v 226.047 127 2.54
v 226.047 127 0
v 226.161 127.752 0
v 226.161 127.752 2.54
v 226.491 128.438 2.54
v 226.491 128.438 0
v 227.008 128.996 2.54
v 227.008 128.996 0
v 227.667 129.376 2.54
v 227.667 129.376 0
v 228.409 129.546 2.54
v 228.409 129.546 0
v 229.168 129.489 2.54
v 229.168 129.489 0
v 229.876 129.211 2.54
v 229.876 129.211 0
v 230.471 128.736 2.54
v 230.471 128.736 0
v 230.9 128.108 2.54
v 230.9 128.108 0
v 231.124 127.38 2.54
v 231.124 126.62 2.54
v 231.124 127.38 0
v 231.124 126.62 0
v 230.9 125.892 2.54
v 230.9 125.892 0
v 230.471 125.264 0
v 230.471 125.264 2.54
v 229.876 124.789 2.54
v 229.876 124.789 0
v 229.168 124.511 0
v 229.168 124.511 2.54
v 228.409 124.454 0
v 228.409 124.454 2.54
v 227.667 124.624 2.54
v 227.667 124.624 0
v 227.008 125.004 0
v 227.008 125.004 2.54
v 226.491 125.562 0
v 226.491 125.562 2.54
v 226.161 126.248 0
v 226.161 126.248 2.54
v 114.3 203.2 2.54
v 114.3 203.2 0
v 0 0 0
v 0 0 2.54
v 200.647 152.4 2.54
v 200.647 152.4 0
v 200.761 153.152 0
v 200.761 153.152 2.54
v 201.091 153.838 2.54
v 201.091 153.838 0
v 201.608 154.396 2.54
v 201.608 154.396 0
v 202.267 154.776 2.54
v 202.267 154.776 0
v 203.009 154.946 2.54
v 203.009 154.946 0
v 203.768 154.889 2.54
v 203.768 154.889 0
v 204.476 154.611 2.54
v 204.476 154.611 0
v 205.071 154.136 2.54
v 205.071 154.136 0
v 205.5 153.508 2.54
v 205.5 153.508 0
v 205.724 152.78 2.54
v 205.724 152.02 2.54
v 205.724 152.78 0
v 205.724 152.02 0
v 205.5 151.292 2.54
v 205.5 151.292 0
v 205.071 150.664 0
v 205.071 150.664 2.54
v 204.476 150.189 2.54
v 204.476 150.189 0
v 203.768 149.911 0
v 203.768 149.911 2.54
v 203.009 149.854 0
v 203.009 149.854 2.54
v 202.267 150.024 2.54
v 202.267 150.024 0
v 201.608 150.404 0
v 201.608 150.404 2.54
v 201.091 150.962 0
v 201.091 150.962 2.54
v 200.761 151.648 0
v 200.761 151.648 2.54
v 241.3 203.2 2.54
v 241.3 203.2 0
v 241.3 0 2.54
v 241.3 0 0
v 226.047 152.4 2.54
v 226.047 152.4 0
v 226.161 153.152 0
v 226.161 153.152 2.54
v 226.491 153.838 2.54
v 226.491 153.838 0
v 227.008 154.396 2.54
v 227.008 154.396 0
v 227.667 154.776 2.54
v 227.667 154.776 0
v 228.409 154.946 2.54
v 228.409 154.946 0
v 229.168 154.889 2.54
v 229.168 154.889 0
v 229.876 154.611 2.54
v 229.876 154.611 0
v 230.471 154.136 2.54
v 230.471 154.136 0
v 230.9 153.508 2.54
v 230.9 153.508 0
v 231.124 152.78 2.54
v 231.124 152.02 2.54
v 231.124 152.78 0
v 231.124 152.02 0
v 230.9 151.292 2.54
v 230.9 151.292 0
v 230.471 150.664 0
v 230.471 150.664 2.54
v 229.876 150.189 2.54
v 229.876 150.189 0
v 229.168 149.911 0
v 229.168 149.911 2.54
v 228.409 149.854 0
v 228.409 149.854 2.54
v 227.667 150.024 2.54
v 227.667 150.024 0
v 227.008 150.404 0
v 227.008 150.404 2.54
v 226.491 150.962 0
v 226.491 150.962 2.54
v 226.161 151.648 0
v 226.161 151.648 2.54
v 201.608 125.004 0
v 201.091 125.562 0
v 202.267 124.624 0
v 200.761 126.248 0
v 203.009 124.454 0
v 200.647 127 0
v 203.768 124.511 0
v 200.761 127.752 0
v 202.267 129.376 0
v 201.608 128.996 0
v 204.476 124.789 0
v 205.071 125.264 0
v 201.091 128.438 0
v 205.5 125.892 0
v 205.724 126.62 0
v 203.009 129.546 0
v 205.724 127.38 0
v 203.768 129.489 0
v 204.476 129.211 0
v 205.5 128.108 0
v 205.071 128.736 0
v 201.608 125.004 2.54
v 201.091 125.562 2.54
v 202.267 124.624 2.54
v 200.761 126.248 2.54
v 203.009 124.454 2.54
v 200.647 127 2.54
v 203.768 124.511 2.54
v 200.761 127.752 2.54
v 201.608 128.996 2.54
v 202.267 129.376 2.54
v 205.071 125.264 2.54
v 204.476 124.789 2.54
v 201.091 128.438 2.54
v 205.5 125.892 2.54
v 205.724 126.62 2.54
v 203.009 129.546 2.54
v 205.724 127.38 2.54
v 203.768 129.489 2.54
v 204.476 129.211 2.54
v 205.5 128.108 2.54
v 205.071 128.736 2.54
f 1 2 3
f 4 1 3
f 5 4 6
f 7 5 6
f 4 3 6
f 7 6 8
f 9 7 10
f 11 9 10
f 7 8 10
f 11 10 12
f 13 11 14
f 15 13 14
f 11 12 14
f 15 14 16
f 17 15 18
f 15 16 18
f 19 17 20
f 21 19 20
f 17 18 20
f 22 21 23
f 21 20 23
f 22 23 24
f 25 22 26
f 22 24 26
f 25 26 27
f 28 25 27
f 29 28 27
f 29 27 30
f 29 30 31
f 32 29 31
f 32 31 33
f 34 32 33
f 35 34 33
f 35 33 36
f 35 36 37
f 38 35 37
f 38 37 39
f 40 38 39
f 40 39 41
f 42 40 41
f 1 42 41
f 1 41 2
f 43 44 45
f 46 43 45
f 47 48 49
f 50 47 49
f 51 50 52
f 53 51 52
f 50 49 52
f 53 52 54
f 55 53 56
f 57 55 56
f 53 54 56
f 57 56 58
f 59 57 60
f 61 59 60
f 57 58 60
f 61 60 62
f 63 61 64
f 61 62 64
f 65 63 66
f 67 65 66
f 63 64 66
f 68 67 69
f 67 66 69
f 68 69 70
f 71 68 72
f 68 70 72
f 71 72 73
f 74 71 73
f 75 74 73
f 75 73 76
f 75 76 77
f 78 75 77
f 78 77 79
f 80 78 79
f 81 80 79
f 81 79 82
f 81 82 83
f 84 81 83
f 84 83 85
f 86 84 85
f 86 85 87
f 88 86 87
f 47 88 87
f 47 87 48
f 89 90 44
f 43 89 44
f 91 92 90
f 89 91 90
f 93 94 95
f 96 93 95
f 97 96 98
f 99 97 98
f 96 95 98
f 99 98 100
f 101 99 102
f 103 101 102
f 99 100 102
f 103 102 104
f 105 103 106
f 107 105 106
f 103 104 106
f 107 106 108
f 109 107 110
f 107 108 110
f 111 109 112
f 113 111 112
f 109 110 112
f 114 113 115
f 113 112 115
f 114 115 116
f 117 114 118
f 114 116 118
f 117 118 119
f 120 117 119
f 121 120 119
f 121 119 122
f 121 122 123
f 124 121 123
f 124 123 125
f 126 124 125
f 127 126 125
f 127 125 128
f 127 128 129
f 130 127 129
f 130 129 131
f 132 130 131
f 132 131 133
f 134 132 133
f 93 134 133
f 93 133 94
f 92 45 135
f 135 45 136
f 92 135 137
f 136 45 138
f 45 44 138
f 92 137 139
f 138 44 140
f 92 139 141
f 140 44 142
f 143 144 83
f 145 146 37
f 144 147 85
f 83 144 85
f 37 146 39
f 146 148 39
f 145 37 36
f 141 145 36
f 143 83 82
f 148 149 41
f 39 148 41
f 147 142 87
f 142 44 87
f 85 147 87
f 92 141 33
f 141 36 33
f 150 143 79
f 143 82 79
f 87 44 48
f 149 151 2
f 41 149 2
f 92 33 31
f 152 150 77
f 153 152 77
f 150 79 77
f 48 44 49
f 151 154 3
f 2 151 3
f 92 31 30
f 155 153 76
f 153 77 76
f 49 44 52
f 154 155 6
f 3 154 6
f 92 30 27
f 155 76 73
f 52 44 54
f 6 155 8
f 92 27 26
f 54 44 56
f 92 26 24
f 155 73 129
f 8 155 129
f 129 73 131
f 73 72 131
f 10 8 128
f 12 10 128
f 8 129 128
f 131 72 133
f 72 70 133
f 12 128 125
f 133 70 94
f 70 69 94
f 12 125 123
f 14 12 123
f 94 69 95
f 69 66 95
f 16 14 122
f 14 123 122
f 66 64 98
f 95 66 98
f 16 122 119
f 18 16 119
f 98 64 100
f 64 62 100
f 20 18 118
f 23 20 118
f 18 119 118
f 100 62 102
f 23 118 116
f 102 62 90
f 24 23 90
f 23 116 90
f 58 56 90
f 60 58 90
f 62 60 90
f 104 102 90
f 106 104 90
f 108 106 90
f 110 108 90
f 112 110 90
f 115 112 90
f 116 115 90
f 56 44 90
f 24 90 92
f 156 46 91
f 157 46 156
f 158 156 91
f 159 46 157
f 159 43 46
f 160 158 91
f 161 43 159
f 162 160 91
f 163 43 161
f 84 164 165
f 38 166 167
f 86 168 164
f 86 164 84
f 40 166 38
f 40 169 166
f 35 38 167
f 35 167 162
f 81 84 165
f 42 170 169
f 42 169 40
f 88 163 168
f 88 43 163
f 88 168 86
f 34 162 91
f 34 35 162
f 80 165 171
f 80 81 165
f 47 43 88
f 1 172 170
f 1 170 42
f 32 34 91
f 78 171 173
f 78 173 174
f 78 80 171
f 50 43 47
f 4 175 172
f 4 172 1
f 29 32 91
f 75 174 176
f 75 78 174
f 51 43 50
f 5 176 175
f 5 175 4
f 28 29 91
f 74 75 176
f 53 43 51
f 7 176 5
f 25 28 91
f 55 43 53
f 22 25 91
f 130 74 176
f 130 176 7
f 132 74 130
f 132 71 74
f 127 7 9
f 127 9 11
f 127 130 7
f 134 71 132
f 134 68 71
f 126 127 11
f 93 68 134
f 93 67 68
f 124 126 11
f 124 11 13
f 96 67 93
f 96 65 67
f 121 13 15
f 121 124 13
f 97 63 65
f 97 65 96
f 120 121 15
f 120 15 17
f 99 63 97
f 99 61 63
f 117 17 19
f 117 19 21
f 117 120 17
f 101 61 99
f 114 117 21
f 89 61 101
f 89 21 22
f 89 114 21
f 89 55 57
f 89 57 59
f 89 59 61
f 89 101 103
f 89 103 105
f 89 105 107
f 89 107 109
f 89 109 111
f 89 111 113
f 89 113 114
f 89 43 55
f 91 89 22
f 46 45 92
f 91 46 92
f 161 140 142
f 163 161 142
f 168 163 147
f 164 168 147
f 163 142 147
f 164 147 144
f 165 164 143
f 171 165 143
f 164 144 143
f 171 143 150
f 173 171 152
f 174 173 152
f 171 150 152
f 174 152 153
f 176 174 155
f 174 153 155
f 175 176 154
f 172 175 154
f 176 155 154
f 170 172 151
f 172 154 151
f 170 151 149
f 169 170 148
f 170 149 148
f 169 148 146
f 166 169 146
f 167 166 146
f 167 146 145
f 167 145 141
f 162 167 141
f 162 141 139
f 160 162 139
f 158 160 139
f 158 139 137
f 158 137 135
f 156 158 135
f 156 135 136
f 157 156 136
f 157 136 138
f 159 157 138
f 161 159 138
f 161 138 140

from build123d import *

# Parameters (mm, degrees)
BOSS_EXTRUDE1_DEPTH    = 2.54
F_10_CLEARANCE_HOLE1_D = 5.1054


with BuildPart() as part:
    # Sketch1 → Boss-Extrude1 (new body)
    with BuildSketch(Plane.XY):
        Polygon((0, 0), (241.3, 0), (241.3, 203.2), (114.3, 203.2), align=None)
    extrude(amount=BOSS_EXTRUDE1_DEPTH)

    # #10 Clearance Hole1 (through all)
    with Locations(Plane.XY.offset(2.54)):
        with Locations((203.2, 152.4), (228.6, 127), (203.2, 127), (228.6, 152.4)):
            Hole(F_10_CLEARANCE_HOLE1_D / 2)


solid = part.part
